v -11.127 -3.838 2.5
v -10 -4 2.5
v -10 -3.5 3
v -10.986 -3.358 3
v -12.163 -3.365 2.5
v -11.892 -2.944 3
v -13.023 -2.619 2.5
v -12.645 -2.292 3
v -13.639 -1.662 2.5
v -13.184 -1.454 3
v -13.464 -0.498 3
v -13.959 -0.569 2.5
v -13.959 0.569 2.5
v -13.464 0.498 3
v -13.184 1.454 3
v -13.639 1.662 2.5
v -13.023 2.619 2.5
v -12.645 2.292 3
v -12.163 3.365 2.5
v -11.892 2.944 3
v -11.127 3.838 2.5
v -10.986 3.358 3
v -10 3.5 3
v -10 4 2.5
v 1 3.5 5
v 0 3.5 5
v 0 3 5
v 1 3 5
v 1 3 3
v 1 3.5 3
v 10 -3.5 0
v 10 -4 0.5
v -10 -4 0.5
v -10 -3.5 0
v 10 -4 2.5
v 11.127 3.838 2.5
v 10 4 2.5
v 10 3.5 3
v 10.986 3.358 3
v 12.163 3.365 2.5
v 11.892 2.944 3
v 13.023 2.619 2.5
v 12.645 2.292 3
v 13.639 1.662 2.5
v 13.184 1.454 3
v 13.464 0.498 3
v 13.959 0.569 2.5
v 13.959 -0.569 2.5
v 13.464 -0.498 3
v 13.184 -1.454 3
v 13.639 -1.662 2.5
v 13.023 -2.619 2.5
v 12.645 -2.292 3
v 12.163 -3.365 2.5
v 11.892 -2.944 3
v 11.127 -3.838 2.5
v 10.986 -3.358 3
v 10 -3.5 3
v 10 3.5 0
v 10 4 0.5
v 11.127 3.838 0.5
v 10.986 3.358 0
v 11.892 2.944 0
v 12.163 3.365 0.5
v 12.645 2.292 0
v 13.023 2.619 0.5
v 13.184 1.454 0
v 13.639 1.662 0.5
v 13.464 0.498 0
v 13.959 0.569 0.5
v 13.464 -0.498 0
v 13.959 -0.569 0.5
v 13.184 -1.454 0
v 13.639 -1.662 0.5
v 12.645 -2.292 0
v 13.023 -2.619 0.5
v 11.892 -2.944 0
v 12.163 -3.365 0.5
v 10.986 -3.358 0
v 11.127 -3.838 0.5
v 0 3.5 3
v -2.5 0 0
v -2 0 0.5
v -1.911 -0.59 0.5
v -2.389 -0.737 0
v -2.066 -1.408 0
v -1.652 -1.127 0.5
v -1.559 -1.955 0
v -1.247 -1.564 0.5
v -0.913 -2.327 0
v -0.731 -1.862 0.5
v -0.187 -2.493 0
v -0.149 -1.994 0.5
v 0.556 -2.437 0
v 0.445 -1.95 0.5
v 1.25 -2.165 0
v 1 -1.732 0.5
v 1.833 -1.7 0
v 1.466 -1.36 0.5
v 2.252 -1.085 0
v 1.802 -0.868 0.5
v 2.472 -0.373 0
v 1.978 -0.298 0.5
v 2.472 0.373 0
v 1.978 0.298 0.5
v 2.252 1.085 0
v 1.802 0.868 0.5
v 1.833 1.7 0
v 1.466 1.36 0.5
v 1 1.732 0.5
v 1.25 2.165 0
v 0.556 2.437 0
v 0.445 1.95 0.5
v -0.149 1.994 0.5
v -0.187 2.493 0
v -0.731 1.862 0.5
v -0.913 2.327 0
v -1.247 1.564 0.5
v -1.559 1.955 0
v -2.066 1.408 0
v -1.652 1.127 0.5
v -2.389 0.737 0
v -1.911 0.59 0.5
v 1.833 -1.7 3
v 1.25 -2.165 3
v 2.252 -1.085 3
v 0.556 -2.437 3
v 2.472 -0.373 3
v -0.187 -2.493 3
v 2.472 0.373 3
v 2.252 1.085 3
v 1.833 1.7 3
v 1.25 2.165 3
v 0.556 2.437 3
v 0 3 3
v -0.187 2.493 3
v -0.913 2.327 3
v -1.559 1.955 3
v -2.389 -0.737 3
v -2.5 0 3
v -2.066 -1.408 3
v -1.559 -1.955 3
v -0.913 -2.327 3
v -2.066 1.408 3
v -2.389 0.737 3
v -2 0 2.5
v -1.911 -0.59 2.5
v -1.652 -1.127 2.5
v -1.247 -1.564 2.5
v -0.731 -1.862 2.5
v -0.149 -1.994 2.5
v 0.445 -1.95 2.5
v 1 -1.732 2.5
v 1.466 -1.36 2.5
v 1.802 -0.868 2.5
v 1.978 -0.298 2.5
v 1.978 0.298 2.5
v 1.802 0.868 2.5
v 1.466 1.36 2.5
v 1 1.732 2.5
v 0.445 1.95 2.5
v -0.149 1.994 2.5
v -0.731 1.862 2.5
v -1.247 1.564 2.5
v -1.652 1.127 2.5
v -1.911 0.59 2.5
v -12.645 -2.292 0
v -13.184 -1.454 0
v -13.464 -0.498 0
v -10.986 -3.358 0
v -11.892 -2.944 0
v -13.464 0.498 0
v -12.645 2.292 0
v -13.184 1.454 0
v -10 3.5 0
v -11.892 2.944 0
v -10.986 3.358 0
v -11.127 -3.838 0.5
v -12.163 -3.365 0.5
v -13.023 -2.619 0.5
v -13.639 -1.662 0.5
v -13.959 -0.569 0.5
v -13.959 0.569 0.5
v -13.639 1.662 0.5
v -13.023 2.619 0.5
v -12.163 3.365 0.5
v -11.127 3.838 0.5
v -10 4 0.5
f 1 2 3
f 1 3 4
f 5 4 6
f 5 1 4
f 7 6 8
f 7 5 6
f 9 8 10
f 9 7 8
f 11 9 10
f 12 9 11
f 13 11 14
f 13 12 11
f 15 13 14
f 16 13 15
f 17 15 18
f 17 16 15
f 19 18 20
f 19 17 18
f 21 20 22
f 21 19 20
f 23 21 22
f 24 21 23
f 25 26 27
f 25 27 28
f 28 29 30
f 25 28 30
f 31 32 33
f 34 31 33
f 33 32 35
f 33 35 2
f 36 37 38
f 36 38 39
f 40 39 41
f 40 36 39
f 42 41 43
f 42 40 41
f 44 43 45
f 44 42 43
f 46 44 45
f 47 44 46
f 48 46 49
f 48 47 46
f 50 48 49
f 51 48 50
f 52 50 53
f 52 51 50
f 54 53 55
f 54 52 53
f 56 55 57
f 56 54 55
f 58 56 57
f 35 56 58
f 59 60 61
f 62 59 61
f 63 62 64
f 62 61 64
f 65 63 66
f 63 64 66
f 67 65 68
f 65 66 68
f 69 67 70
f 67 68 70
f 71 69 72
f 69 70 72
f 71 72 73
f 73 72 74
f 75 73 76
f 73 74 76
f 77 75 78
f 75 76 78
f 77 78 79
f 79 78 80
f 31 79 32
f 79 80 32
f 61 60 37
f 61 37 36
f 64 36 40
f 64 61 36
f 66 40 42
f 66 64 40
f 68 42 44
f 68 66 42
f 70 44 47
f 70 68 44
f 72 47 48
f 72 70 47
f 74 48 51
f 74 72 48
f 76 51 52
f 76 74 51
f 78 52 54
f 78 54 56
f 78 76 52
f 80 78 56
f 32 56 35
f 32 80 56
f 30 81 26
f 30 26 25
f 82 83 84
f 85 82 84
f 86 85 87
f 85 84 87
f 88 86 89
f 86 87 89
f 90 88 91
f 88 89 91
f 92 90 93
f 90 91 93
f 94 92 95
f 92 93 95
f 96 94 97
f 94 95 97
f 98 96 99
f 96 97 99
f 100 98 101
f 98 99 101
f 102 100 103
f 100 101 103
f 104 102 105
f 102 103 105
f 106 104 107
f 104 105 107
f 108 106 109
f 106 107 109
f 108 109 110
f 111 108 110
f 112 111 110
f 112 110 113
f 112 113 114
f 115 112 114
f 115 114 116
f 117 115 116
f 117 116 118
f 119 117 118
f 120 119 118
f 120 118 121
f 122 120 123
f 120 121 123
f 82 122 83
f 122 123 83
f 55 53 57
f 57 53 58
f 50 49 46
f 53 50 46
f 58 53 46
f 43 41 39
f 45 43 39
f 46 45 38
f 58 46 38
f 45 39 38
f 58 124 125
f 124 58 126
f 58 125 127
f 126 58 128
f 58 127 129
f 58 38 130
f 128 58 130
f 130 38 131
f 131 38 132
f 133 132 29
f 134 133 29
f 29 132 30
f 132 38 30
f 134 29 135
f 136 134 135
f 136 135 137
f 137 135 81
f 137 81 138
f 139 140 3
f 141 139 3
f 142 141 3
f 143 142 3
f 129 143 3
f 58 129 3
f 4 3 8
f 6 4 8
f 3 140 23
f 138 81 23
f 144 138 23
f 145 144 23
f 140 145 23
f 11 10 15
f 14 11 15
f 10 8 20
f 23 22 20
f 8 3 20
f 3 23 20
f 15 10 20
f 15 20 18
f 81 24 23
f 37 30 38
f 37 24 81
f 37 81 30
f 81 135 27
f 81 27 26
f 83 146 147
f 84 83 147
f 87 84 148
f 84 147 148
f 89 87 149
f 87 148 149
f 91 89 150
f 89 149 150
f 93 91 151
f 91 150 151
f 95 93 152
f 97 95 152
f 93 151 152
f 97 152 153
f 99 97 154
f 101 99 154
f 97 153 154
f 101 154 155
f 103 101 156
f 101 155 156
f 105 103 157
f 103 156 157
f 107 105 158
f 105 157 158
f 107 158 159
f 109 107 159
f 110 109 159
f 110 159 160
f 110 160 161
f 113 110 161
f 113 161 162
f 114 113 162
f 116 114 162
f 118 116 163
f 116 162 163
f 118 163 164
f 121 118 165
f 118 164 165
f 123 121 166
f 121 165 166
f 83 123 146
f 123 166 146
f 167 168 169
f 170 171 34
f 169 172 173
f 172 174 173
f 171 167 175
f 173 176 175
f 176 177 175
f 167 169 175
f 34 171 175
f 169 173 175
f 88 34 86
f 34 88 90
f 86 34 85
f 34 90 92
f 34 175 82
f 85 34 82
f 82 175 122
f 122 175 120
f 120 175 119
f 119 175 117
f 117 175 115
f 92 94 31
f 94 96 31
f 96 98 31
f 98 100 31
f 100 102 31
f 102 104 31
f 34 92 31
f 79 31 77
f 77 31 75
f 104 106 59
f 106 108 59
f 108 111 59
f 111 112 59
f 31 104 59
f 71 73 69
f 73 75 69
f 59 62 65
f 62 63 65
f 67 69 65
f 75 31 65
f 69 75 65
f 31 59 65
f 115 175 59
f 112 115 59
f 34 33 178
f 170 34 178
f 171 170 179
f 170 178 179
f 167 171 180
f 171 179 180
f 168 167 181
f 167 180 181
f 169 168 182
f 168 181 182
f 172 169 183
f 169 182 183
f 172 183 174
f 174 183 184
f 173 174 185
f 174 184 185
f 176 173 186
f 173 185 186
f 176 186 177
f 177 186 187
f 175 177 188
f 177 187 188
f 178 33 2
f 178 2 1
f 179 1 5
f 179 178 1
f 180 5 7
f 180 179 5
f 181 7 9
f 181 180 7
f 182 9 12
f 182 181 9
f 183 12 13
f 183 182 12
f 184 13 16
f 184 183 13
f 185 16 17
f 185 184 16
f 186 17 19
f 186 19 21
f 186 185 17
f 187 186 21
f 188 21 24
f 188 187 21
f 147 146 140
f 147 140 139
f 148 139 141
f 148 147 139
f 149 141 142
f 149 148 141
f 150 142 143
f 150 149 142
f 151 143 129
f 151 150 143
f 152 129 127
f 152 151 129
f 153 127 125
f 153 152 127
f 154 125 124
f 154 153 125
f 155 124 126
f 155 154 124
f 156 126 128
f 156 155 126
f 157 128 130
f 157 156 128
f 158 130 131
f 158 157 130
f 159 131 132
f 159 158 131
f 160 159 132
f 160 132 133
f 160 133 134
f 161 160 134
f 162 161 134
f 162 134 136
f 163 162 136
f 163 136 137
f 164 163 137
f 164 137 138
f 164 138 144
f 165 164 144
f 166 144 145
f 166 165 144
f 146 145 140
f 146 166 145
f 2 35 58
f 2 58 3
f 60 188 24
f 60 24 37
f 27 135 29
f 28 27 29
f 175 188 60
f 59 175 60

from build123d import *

# Parameters (mm, degrees)
BASE_EXTRUSION_DEPTH    = 3
ESQUISSE2_R             = 2
ENL_V_MAT_EXTRU_1_DEPTH = 3
CHANFREIN1_SIZE         = 0.5
ESQUISSE4_W             = 1
ESQUISSE4_H             = 0.5
BOSS_EXTRU_1_DEPTH      = 5


with BuildPart() as part:
    # Esquisse1 → Base-Extrusion (new body)
    with BuildSketch(Plane.XY):
        with BuildLine():
            Line((-10, 4), (10, 4))
            ThreePointArc((10, 4), (14, 0), (10, -4))
            Line((10, -4), (-10, -4))
            ThreePointArc((-10, -4), (-14, 0), (-10, 4))
        make_face()
    extrude(amount=BASE_EXTRUSION_DEPTH)

    # Esquisse2 → Enlèv. mat.-Extru.1 (cut)
    with BuildSketch(Plane.XY.offset(3)):
        with Locations(Location((0, 0, 0), (0, 0, 180))):
            Circle(ESQUISSE2_R)
    extrude(amount=-ENL_V_MAT_EXTRU_1_DEPTH, mode=Mode.SUBTRACT)

    # Chanfrein1
    chanfrein1_edges = [part.edges().sort_by_distance(p)[0] for p in [
        (0, -4, 0),
        (0, -4, 3),
        (14, 0, 0),
        (14, 0, 3),
        (-14, 0, 0),
        (-14, 0, 3),
        (0, 4, 0),
        (2, 0, 0),
        (0, 4, 3),
        (2, 0, 3),
    ]]
    chamfer(chanfrein1_edges, length=CHANFREIN1_SIZE)

    # Esquisse4 → Boss.-Extru.1 (add)
    with BuildSketch(Plane.XY):
        with Locations((0.5, 3.25)):
            Rectangle(ESQUISSE4_W, ESQUISSE4_H)
    extrude(amount=BOSS_EXTRU_1_DEPTH)


solid = part.part
